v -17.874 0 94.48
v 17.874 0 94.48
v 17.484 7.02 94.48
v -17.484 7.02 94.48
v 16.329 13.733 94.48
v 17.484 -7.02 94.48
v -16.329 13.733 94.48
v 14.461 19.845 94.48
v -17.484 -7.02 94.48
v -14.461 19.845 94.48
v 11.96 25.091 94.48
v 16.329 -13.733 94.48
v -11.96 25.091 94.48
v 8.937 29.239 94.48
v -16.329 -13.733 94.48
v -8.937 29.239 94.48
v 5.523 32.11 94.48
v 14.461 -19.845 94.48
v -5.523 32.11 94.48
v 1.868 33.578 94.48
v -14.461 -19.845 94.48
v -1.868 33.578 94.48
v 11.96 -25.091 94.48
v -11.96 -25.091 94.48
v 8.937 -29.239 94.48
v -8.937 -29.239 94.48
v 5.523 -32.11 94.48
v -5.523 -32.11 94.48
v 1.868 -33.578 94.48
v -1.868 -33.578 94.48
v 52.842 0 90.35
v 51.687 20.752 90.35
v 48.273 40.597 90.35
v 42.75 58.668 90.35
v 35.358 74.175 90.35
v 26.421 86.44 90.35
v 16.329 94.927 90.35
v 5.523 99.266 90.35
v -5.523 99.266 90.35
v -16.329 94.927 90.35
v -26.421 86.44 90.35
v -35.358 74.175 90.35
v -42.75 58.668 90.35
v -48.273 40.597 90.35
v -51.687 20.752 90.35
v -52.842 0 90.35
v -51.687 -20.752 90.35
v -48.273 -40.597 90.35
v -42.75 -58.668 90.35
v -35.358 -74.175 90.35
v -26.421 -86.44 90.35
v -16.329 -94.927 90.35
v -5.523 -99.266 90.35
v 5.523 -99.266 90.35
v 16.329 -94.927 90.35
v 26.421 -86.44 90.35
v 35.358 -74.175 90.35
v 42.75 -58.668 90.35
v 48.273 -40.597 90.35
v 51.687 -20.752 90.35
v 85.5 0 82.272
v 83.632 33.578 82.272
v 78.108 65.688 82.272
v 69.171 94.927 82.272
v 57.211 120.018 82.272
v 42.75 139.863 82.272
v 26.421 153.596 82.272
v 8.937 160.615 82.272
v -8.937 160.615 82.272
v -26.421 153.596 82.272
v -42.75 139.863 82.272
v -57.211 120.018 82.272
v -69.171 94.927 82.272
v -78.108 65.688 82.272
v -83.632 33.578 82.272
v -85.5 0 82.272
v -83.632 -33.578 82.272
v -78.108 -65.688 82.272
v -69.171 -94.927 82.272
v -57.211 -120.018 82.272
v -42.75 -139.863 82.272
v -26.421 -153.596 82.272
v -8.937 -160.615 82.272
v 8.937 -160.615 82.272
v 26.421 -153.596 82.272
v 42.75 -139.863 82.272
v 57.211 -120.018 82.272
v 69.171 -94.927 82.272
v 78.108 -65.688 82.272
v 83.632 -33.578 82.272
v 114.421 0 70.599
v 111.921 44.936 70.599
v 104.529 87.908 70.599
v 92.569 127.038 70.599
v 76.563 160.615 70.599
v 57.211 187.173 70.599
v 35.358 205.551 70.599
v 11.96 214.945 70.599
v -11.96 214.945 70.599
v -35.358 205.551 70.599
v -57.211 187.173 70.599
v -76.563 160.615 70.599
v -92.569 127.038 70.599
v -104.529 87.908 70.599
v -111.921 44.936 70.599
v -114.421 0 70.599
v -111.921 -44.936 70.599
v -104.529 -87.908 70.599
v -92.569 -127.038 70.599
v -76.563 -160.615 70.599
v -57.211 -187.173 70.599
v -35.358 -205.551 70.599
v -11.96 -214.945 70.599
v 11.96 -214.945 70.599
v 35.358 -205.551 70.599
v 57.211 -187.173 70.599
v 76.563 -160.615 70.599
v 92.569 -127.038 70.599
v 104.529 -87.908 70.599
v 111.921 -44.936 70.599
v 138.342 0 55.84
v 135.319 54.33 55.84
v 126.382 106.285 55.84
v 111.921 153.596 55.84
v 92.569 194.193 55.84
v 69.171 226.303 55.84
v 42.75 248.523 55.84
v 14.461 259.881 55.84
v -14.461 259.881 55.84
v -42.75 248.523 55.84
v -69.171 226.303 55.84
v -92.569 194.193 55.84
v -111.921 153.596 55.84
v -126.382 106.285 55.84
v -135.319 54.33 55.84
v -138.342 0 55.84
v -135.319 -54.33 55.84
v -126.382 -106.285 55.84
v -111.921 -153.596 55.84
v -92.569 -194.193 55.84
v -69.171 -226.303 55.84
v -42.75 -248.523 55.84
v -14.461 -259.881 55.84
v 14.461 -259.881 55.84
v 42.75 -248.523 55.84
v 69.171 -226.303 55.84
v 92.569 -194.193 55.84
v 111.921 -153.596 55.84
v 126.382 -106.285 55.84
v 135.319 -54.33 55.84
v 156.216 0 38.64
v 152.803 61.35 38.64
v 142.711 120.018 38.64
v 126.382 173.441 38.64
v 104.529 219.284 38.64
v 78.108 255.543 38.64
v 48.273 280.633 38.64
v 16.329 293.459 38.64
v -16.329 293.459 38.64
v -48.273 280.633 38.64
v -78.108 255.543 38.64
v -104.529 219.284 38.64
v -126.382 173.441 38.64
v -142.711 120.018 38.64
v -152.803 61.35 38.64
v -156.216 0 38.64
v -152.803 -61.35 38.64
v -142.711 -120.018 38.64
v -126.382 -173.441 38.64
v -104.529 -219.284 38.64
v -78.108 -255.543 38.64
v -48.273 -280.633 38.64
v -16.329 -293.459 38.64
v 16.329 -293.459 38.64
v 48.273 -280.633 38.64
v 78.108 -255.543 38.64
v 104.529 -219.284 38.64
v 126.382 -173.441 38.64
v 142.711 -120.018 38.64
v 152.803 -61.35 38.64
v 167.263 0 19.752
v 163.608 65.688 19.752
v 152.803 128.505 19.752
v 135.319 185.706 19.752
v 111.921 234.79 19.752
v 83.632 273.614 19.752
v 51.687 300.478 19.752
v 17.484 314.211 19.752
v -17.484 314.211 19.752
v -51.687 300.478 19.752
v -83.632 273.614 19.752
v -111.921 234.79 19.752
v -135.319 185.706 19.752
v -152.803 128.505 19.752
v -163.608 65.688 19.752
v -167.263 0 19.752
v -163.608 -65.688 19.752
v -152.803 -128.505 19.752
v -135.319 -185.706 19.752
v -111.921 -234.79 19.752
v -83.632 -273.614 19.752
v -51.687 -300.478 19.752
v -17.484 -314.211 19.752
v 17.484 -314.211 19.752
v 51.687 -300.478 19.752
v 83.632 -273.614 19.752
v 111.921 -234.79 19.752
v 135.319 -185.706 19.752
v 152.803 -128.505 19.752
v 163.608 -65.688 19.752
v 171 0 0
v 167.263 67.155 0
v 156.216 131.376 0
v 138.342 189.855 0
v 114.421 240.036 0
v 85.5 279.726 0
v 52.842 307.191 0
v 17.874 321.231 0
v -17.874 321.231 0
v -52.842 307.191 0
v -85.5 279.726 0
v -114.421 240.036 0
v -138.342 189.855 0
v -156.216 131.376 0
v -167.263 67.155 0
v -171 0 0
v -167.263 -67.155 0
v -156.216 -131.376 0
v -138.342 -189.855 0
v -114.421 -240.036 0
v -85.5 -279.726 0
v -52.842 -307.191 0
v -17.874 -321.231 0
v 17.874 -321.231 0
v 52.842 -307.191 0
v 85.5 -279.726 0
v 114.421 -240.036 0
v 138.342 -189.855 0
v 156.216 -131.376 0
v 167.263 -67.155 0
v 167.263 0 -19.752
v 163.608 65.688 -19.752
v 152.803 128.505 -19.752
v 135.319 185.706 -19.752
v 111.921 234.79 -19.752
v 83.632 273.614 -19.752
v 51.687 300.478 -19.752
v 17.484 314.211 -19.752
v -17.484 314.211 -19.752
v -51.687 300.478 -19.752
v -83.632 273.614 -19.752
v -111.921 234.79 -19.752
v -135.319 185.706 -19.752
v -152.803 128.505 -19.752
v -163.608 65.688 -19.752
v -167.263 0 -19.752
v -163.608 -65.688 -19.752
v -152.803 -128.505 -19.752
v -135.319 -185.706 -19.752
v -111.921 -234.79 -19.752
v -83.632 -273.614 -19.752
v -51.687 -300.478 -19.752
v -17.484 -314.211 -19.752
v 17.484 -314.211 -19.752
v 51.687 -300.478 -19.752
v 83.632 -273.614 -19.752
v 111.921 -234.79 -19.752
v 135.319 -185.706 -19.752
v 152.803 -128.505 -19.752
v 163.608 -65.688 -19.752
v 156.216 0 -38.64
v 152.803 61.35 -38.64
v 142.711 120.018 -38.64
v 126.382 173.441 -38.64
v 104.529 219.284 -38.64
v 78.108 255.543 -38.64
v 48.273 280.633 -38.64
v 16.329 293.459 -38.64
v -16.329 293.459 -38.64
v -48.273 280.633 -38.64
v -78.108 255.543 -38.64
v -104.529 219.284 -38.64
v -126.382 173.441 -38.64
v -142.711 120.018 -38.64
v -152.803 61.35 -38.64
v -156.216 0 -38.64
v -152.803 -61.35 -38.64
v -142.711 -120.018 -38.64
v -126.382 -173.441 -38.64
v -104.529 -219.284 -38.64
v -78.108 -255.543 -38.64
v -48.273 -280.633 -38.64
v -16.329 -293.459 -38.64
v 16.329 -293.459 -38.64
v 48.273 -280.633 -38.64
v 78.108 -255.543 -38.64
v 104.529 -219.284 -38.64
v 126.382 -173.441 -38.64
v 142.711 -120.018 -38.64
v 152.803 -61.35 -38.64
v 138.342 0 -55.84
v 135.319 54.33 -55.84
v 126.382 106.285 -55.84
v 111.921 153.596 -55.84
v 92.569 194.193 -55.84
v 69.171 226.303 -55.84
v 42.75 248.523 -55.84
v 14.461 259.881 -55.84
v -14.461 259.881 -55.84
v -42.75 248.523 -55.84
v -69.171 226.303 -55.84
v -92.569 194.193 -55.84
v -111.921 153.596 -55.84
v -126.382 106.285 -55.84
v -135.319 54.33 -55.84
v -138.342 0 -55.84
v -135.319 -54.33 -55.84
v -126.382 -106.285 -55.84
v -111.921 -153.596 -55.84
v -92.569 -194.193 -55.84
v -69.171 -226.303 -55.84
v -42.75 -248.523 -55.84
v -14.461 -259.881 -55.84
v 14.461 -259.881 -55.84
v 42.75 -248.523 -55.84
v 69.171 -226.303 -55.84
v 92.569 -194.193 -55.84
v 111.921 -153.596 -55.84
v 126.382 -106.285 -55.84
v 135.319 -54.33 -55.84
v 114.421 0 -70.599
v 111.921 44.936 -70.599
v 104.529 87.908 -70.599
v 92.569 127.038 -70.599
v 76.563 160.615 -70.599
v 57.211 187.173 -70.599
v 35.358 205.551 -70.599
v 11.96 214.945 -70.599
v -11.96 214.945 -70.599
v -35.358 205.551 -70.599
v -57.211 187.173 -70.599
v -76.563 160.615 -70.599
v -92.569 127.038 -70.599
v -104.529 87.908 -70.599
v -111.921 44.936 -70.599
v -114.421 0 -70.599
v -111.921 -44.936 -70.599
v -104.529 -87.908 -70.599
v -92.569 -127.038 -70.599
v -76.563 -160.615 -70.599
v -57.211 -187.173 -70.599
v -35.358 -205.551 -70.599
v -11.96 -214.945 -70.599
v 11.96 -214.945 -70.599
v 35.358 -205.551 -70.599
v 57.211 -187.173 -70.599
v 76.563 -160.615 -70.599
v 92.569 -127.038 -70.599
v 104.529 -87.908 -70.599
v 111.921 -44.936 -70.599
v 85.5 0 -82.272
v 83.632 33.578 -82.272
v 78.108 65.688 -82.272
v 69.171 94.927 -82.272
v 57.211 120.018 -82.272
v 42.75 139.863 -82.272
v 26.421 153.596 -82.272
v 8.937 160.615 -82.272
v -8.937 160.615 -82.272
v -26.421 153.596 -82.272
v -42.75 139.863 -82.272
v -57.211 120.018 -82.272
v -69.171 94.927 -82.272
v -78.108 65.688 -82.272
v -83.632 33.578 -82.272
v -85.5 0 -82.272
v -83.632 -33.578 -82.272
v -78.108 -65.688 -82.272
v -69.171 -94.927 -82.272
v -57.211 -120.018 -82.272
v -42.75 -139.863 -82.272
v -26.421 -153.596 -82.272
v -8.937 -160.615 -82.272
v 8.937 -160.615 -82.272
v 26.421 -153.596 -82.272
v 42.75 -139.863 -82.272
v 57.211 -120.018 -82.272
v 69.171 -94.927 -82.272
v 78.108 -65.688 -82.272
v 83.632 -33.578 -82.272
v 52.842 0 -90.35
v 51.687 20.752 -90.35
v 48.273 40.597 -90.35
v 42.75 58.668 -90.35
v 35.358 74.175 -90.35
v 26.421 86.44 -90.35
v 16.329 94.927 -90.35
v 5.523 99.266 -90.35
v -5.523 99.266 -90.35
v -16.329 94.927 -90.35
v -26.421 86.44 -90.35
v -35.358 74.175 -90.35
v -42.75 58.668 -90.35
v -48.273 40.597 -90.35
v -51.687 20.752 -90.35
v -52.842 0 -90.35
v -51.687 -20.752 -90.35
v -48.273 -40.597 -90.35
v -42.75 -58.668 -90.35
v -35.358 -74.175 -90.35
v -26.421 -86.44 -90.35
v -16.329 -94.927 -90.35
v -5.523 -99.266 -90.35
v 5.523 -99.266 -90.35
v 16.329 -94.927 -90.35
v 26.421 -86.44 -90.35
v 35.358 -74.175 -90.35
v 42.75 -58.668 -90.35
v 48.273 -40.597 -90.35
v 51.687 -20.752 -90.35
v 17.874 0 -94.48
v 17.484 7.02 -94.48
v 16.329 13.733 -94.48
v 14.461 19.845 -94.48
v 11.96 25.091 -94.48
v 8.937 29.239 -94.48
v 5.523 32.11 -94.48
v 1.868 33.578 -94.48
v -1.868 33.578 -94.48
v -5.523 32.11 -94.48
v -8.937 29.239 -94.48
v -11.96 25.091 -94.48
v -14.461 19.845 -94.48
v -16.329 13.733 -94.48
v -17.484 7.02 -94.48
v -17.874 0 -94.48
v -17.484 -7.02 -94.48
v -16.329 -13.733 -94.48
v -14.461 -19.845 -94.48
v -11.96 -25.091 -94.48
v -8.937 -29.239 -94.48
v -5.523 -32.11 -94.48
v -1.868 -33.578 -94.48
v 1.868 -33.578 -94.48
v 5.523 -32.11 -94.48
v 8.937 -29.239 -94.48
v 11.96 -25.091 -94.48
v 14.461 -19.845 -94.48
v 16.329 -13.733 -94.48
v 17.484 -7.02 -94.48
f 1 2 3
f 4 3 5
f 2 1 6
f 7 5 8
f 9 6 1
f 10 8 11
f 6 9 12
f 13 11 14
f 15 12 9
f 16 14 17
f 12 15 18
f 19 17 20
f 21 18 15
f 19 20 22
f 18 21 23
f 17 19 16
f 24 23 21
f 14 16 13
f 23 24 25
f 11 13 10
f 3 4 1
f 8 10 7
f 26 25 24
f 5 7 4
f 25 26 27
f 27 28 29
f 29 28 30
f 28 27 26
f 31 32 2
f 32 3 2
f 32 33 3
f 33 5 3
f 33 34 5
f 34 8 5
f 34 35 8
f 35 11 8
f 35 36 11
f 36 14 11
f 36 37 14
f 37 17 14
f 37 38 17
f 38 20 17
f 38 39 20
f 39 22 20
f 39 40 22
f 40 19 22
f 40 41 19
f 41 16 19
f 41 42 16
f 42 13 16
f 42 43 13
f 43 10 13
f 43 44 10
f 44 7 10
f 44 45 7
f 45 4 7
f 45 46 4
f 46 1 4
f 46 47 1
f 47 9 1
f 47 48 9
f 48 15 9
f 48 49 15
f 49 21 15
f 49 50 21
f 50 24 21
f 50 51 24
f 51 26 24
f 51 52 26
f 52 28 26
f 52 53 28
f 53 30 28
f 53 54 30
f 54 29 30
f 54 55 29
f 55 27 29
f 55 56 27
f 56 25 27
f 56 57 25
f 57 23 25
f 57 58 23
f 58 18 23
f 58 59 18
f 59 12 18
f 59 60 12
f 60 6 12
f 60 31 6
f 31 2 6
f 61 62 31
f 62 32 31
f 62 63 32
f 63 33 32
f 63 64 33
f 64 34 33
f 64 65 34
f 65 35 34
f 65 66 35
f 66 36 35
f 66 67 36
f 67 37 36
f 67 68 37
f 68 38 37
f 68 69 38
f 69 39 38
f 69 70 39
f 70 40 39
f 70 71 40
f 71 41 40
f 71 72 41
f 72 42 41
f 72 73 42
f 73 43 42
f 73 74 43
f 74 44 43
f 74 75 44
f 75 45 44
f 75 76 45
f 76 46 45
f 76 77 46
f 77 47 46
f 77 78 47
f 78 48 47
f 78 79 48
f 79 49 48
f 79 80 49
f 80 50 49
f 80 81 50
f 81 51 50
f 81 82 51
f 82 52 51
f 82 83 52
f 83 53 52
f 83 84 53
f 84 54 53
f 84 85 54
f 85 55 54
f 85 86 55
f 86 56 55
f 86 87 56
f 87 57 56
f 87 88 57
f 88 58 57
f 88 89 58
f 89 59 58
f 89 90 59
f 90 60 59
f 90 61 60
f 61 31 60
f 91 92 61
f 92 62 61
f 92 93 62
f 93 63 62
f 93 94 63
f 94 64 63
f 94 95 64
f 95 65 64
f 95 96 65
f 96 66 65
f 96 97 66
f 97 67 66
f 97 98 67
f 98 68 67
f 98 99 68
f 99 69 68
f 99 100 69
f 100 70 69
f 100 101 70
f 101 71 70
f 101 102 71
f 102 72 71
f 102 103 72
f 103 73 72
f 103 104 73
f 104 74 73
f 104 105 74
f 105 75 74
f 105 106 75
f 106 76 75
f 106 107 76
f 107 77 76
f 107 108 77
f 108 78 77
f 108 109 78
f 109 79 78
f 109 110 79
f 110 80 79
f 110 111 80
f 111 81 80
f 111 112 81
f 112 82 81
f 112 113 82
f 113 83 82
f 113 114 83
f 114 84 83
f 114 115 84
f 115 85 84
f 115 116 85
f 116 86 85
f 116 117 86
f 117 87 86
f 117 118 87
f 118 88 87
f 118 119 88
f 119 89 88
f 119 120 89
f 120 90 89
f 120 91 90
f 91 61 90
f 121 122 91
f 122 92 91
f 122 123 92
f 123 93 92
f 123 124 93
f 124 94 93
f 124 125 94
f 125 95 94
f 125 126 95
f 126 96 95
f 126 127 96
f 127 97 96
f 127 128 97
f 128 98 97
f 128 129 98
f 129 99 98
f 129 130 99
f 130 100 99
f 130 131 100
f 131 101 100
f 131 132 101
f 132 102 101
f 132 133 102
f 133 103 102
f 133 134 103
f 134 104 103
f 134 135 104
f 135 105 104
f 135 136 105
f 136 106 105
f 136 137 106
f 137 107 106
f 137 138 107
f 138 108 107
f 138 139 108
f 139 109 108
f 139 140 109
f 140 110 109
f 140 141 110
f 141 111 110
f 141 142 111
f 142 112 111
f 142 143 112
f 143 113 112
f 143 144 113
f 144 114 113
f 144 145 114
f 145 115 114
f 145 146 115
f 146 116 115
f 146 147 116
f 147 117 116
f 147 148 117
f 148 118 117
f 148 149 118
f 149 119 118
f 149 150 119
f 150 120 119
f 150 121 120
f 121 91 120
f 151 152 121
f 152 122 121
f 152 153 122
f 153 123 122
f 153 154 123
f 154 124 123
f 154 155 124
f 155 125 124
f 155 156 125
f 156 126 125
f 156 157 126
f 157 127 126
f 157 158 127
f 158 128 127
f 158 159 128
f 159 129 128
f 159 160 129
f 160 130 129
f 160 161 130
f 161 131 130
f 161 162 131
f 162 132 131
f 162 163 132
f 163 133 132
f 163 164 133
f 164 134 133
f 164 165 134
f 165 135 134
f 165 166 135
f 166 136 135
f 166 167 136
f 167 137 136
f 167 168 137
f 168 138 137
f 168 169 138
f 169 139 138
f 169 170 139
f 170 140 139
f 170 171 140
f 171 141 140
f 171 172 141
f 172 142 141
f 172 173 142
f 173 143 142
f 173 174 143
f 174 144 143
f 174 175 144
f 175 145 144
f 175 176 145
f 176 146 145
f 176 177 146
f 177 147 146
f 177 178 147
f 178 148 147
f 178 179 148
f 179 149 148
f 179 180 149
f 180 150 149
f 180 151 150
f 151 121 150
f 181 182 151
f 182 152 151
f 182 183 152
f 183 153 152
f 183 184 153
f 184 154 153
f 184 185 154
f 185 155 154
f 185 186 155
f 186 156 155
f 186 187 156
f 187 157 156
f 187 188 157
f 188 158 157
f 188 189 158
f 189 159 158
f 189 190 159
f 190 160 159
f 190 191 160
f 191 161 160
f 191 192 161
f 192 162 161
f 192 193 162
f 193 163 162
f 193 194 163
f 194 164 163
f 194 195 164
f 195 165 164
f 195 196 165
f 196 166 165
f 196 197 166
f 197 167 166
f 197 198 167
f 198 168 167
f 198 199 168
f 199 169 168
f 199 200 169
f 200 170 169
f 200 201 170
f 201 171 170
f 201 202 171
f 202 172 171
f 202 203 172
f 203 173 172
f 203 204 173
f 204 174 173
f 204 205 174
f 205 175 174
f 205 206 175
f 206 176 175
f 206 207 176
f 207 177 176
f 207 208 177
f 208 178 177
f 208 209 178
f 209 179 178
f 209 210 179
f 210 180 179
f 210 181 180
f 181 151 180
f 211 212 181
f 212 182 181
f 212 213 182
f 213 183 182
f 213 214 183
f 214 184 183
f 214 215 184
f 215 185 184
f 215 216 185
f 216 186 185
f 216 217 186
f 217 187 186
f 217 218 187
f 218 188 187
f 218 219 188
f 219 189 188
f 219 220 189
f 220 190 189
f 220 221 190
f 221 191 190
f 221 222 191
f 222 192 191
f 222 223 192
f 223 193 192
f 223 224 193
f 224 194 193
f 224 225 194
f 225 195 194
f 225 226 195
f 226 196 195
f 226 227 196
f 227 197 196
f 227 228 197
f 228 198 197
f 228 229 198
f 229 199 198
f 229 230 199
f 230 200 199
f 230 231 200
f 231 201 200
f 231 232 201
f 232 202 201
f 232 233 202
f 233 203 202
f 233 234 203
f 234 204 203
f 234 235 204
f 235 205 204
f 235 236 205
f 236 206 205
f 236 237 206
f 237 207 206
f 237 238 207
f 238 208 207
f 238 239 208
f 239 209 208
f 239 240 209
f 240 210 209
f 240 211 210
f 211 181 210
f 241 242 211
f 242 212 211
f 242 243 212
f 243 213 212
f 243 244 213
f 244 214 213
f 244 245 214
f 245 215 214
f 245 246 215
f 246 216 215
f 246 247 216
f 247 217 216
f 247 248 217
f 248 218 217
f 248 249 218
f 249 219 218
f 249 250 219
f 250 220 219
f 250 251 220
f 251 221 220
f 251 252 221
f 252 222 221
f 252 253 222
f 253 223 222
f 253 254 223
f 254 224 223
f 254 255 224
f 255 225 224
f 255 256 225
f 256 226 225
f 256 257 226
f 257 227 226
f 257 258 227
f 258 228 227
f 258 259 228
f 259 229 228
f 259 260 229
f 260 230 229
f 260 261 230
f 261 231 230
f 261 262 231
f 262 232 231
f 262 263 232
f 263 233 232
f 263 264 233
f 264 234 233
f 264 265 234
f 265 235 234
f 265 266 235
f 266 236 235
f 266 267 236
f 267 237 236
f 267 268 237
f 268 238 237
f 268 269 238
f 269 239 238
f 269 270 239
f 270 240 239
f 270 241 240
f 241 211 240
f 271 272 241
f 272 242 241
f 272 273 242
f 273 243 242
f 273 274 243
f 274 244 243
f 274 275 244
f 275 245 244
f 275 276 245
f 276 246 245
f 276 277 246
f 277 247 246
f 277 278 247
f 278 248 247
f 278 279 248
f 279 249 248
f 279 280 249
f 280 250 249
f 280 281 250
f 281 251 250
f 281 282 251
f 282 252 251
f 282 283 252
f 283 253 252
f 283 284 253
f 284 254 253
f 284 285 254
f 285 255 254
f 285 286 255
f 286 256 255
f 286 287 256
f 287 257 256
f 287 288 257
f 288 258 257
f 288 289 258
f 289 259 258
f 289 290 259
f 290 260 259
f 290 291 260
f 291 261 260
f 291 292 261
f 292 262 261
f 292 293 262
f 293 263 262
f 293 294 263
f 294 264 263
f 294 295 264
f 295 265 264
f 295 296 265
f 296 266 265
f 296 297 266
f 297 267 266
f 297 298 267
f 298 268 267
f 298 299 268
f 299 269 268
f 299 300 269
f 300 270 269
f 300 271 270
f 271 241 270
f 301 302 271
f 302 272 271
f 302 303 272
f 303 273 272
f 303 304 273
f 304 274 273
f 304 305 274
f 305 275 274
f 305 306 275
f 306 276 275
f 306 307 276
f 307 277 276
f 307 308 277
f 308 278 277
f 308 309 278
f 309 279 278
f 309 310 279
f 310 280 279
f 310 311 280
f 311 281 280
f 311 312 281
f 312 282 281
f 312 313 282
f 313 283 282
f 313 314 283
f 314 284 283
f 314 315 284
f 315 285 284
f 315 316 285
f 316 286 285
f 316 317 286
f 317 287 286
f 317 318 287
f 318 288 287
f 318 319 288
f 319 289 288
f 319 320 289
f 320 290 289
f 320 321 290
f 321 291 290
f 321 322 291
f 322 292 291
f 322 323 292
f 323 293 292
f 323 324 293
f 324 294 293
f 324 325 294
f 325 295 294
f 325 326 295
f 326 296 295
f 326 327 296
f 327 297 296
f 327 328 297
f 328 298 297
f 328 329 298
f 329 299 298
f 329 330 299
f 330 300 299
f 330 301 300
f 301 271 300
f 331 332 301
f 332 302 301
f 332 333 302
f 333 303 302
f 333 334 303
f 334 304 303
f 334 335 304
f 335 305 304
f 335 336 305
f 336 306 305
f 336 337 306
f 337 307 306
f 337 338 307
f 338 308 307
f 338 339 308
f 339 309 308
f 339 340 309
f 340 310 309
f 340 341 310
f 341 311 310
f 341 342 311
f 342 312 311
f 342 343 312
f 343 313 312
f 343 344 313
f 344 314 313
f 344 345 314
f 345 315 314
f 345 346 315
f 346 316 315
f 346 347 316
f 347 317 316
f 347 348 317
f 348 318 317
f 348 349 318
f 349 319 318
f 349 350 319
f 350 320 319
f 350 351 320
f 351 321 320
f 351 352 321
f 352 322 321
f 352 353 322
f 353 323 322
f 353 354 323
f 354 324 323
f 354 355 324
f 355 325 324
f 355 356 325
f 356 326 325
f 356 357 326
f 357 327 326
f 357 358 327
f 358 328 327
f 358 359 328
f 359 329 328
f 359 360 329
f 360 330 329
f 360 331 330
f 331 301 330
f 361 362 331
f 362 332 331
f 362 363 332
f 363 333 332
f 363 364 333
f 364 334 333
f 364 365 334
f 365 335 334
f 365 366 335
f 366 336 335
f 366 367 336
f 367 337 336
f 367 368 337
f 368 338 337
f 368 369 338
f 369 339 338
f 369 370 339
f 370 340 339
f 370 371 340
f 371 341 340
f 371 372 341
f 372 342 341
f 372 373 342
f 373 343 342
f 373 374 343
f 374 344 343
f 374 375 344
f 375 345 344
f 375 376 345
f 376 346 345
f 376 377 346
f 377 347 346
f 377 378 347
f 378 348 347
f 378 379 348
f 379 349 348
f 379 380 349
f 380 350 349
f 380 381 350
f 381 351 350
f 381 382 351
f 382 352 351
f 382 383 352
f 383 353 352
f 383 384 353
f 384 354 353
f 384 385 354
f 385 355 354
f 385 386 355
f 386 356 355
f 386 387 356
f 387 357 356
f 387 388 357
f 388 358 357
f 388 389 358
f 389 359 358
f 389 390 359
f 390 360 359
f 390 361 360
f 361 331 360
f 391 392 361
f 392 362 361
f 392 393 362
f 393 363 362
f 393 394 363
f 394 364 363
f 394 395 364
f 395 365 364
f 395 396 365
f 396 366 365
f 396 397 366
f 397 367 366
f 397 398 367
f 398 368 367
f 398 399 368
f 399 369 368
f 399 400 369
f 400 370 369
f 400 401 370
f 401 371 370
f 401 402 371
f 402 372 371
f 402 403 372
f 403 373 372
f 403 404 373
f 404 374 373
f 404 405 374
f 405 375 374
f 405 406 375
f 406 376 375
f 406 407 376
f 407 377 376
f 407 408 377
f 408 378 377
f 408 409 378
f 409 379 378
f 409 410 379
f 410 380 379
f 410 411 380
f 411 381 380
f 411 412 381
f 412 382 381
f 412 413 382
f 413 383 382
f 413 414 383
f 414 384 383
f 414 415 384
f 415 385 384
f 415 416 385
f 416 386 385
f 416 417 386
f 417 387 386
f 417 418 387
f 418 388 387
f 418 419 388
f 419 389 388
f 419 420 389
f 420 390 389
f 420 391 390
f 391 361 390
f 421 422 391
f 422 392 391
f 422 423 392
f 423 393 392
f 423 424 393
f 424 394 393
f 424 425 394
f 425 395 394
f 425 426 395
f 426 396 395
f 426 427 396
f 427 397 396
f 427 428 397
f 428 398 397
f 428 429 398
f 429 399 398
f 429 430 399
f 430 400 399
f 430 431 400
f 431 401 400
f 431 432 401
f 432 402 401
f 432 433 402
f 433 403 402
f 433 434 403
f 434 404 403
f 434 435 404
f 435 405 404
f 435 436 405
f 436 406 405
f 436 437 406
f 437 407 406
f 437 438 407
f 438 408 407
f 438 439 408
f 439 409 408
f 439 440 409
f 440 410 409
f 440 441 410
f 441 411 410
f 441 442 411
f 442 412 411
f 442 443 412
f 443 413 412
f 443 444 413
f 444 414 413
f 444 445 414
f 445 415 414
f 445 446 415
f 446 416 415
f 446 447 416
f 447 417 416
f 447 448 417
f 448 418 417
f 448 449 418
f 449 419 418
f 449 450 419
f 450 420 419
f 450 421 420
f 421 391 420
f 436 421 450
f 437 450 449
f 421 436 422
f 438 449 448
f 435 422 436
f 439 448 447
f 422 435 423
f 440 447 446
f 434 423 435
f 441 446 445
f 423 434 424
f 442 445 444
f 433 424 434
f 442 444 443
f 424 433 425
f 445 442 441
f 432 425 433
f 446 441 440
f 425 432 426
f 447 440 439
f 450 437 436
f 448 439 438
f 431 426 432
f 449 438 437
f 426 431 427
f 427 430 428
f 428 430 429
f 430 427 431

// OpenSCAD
// Generated by SolidPython 1.0.1 on 2020-07-29 00:46:49


scale(v = [9, 17, 5]) {
	sphere(r = 19);
}
/***********************************************
*********      SolidPython code:      **********
************************************************
 
# import packages: SolidPython
from solid import *
from solid.utils import *
from itertools import chain, combinations, permutations


class Resize:

    def __init__(self, scad_file):
        self.scad_file = scad_file
        #self.scad_file = import_scad(scad_file)
        # cone/cylinder param:
        self.r1 = 0
        self.r2 = 0
        self.h = 0
        # rectangular prism param:
        self.w = 0
        self.l = 0
        # ellipse param:
        self.r = 0

    # import OpenScad code (file name corresponds to shape)


    # classify shape + parameters
    def assign(self, param1, param2, param3):
        if self.scad_file == 'cone.scad':
            self.r1 = param1
            self.r2 = param2
            self.h = param3
        elif self.scad_file == 'cylinder.scad':
            self.r1 = param1
            self.r2 = param2
            self.h = param3
        elif self.scad_file == 'rectangularPrism.scad':
            self.h = param1
            self.l = param2
            self.w = param3
        else:
            self.r = param1
            self.h = param2

    # resize parameters
    def iterate(self):
        x = range(3, 20, 2)
        i = 1
        if self.scad_file == 'cone.scad':
            tempList = list(permutations(x, 2))
            for temp in tempList:
                param1 = temp[0]
                param2 = temp[1]
                filepath = 'produced_scad_files/' + 'cone' + str(param1) + '_' + str(param2) + '_' + '.scad'
                scad_render_to_file(cylinder(h=param1, r1=param2, r2=0), filepath)

        elif self.scad_file == 'cylinder.scad':
            tempList = list(permutations(x, 3))
            for temp in tempList:
                param1 = temp[0]
                param2 = temp[1]
                filepath = 'produced_scad_files/' + 'cylinder' + str(param1) + '_' + str(param2) + '_' + '.scad'
                scad_render_to_file(cylinder(h=param1, r1=param2, r2=param2), filepath)

        elif self.scad_file == 'rectangularPrism.scad':
            tempList = list(permutations(x, 3))
            for temp in tempList:
                param1 = temp[0]
                param2 = temp[1]
                param3 = temp[2]
                filepath = 'produced_scad_files/' + 'rectangularPrism' + str(param1) + '_' + str(param2) + '_' + str(
                    param3) + '.scad'
                scad_render_to_file(cube(size=(param1, param2, param3)), filepath)

        elif self.scad_file == 'ellipse.scad':
            tempList = list(permutations(x, 4))
            for temp in tempList:
                param1 = temp[0]
                param2 = temp[1]
                param3 = temp[2]
                param4 = temp[3]
                filepath = 'produced_scad_files/' + 'ellipse' + str(param1) + '_' + str(param2) + '_' + str(param3) + '_' + str(param4) + '.scad'
                scad_render_to_file(scale([param1, param2, param3])(sphere(r=param4)), filepath)

    def render_to_scadfile(self):
        scad_render_to_file(scad, 'example.scad') 
 
************************************************/
